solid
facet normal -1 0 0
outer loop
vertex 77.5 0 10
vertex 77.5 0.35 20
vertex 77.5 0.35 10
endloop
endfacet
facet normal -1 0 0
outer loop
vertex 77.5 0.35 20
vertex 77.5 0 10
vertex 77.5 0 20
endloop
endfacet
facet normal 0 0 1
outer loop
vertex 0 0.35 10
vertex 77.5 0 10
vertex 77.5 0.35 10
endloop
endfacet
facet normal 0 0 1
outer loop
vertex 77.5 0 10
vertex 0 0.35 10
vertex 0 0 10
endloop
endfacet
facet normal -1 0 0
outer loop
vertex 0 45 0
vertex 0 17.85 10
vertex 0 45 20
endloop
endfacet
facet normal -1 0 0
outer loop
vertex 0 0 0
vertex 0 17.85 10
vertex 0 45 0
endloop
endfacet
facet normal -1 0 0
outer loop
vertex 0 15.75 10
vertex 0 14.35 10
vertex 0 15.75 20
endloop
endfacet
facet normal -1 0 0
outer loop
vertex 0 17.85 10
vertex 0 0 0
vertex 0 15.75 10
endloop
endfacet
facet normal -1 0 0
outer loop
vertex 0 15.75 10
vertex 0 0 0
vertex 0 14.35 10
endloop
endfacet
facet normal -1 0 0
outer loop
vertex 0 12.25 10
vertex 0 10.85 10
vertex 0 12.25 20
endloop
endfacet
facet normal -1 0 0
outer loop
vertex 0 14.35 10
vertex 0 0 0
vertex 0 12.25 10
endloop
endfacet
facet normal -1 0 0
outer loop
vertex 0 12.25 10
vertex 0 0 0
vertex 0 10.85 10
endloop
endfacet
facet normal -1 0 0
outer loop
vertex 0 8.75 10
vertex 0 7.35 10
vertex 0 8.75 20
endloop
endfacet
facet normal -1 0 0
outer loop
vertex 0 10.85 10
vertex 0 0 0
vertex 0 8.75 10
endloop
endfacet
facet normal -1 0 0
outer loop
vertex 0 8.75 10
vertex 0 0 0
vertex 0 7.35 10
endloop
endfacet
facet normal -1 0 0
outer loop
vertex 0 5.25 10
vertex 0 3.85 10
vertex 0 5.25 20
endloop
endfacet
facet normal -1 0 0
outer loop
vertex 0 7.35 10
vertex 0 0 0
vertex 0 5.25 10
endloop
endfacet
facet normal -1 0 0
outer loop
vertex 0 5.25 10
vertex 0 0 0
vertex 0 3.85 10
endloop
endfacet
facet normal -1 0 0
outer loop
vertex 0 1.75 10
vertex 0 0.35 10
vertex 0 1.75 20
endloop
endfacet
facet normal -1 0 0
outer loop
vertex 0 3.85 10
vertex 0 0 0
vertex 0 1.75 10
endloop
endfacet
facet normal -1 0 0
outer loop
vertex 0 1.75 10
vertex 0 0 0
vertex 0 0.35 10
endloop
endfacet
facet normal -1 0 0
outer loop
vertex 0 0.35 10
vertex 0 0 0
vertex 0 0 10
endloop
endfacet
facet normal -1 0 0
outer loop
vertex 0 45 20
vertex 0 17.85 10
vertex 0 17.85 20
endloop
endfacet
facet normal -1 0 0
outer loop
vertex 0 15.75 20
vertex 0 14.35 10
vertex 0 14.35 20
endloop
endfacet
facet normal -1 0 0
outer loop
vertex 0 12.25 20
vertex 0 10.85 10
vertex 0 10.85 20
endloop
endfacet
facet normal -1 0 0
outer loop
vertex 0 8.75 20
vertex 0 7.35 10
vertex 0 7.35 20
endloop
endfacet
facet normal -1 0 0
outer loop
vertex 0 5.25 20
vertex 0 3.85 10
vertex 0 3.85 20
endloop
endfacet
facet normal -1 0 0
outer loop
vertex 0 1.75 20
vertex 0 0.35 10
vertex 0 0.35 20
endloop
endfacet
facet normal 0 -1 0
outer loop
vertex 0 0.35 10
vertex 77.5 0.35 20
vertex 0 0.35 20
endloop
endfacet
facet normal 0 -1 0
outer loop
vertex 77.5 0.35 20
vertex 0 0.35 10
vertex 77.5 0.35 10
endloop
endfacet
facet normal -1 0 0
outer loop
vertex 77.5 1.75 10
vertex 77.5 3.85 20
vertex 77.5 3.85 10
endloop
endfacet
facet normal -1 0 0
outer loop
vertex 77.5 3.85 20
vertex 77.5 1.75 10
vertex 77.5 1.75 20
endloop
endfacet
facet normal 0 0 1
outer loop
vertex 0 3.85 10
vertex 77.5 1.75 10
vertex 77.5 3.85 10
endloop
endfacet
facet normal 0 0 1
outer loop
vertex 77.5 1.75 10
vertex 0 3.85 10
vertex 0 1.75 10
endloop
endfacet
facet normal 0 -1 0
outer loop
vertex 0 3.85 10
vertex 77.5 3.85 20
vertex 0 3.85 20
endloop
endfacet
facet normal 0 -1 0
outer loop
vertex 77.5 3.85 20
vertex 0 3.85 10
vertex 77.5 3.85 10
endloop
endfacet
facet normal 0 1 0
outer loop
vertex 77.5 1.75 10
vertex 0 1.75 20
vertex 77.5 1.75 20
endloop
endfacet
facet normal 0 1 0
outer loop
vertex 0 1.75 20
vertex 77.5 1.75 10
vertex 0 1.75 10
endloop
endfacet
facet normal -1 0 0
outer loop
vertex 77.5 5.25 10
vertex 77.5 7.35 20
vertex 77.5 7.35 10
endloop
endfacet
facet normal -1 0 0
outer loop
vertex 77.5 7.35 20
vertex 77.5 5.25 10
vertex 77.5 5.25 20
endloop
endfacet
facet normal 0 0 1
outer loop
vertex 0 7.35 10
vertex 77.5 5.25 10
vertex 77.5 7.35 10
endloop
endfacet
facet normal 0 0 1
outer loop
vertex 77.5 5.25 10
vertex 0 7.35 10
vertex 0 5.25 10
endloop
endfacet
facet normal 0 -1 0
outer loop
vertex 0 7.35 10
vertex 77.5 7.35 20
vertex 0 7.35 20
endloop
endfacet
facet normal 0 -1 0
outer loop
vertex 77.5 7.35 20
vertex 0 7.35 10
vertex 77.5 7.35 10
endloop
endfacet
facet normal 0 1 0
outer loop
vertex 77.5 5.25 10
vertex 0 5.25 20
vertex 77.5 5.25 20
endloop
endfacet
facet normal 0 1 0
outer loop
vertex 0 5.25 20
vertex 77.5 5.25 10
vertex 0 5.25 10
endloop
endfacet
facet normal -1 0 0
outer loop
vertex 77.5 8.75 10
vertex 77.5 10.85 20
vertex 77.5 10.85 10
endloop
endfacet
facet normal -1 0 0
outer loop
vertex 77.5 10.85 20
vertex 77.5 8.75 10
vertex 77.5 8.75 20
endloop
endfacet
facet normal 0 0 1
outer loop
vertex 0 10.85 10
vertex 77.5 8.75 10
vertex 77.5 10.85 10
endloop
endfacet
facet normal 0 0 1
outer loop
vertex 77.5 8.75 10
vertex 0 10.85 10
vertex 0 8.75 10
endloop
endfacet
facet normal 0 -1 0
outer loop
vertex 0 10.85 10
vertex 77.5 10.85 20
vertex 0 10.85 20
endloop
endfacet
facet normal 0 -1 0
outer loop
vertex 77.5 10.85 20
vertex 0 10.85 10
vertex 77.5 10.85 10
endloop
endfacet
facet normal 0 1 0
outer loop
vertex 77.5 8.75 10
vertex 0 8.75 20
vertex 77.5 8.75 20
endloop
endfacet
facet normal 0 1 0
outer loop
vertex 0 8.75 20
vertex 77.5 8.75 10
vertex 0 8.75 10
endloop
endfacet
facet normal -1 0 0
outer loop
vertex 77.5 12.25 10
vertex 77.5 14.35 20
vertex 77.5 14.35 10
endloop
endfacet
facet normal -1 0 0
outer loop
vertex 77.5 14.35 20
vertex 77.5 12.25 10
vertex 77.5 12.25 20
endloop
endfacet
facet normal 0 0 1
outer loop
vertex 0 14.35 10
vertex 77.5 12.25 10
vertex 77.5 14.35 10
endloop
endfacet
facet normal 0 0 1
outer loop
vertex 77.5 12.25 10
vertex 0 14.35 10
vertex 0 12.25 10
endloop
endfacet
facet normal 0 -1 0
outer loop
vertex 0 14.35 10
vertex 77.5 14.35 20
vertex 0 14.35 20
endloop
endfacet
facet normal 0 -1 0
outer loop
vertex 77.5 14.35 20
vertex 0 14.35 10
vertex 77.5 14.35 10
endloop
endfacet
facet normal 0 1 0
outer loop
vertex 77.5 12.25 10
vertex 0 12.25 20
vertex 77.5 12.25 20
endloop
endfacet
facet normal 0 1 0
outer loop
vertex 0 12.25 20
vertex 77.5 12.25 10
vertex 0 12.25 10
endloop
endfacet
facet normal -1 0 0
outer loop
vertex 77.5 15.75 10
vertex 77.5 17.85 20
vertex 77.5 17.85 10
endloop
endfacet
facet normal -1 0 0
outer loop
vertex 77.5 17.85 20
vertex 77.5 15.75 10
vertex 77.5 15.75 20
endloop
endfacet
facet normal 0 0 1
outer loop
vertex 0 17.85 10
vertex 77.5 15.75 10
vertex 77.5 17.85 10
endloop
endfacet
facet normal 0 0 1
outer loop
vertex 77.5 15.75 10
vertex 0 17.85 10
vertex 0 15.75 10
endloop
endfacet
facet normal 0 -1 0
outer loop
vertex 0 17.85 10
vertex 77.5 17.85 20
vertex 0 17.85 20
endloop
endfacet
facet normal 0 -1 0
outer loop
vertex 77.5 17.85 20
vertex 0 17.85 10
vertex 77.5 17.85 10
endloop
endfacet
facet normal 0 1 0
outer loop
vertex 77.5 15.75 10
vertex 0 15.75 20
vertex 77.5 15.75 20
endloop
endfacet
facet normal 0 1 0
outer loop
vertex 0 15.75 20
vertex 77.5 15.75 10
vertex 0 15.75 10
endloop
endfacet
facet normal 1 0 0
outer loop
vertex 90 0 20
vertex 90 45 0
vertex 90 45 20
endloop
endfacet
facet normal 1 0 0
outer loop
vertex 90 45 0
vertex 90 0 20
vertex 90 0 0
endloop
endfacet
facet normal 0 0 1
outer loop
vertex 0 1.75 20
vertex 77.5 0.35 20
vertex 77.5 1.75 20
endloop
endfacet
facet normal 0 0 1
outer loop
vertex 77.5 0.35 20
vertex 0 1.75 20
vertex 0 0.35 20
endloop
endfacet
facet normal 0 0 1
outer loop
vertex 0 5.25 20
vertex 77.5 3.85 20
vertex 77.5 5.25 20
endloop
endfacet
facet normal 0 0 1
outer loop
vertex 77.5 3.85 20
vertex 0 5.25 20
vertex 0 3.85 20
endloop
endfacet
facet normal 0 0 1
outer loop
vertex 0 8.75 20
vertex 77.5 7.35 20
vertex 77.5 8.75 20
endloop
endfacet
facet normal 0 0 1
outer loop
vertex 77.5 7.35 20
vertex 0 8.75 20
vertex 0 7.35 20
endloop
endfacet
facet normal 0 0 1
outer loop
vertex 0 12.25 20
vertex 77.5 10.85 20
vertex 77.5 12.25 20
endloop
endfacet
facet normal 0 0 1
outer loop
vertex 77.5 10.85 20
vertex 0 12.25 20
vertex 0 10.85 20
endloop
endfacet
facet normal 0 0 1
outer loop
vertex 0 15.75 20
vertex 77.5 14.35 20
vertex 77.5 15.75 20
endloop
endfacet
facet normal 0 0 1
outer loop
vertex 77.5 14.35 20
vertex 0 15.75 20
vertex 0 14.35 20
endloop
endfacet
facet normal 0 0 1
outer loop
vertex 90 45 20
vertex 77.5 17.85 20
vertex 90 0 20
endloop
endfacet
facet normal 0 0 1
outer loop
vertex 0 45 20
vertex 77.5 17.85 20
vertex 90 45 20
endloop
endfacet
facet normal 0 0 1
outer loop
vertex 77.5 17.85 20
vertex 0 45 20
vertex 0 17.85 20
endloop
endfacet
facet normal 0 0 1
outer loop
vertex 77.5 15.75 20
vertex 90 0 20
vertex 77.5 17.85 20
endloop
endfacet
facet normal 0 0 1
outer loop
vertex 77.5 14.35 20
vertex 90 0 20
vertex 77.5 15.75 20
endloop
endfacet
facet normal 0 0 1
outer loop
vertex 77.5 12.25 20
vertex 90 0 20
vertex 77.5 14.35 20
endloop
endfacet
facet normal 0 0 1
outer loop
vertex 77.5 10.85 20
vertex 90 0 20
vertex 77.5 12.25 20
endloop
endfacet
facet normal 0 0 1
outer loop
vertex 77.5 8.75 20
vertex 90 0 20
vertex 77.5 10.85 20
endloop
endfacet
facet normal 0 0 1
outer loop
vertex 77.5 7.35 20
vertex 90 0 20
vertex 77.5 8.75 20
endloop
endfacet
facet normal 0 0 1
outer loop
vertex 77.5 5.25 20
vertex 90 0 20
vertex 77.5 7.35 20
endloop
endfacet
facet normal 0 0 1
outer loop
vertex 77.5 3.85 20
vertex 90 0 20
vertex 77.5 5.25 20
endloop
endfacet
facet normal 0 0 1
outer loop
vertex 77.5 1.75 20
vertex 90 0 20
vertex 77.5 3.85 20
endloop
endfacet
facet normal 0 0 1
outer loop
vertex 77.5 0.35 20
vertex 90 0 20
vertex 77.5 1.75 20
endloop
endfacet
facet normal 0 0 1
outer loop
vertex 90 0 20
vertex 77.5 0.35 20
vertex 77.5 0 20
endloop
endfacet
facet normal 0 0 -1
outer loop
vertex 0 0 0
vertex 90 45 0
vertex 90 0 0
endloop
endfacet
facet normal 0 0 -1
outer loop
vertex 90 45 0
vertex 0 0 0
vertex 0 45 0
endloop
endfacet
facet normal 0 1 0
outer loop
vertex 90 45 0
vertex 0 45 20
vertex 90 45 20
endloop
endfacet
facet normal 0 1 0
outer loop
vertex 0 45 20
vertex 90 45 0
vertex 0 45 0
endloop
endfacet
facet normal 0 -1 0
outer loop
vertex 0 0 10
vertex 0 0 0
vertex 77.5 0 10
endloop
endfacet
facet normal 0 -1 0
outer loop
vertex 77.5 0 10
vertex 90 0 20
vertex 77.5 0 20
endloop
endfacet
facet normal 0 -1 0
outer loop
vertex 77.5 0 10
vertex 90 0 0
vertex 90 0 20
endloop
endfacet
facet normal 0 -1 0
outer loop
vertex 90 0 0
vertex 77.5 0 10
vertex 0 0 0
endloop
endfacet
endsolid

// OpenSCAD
// Drying Rack for 10 Microscope Slides
// Base: 90 x 45 x 20 mm
// Slots: 10 parallel slots, 77mm long, 1.6mm wide, 10mm deep
// Spacing: 3.5mm centre-to-centre (Y)
// Orientation: Rests on XY plane at Z=0, builds upward (+Z)

// Base Dimensions
$base_length = 90;
$base_width = 45;
$base_height = 20;

// Slide Dimensions (for reference)
$slide_length = 75;
$slide_width = 25;
$slide_thickness = 1;

// Slot Dimensions
$num_slots = 10;
$slot_length = 77;
$slot_width = 1.6;
$slot_depth = 10;
$slot_spacing = 3.5; // Centre-to-centre in Y

// Extrusion quality for curved/rounded features
$fn = 64;

// --- Main Block ---
difference() {
    // Create the solid base block
    translate([0, 0, 0])
        cube([
            $base_length,
            $base_width,
            $base_height
        ]);

    // Cut 10 parallel slots
    // Slots run along X, so we cut cylinders or boxes oriented along X.
    // We use a box for the cut to ensure sharp corners and exact dimensions.
    // The cut shape extends slightly past the slot length to ensure clean removal.
    $cut_extension = 0.5; 
    
    for (i = [0 : $num_slots - 1]) {
        // Calculate Y position for the centre of the slot
        // The group is centred on the block in Y.
        // Total span of centres = (num_slots - 1) * spacing
        // Offset from centre = - (total_span / 2)
        $total_span = ($num_slots - 1) * $slot_spacing;
        $y_offset = -($total_span / 2);
        
        $slot_y = $y_offset + (i * $slot_spacing);
        
        // Define the cutting shape (Box)
        // Length along X: slot_length + extension
        // Width along Y: slot_width + extension (to ensure full cut)
        // Height along Z: slot_depth + extension (to ensure full cut)
        $cut_length = $slot_length + $cut_extension;
        $cut_width = $slot_width + $cut_extension;
        $cut_height = $slot_depth + $cut_extension;
        
        translate([
            0,              // X is centred
            $slot_y,        // Y position
            $base_height - $slot_depth // Z position: start at top face and go down
        ])
            cube([
                $cut_length,
                $cut_width,
                $cut_height
            ]);
    }
}
